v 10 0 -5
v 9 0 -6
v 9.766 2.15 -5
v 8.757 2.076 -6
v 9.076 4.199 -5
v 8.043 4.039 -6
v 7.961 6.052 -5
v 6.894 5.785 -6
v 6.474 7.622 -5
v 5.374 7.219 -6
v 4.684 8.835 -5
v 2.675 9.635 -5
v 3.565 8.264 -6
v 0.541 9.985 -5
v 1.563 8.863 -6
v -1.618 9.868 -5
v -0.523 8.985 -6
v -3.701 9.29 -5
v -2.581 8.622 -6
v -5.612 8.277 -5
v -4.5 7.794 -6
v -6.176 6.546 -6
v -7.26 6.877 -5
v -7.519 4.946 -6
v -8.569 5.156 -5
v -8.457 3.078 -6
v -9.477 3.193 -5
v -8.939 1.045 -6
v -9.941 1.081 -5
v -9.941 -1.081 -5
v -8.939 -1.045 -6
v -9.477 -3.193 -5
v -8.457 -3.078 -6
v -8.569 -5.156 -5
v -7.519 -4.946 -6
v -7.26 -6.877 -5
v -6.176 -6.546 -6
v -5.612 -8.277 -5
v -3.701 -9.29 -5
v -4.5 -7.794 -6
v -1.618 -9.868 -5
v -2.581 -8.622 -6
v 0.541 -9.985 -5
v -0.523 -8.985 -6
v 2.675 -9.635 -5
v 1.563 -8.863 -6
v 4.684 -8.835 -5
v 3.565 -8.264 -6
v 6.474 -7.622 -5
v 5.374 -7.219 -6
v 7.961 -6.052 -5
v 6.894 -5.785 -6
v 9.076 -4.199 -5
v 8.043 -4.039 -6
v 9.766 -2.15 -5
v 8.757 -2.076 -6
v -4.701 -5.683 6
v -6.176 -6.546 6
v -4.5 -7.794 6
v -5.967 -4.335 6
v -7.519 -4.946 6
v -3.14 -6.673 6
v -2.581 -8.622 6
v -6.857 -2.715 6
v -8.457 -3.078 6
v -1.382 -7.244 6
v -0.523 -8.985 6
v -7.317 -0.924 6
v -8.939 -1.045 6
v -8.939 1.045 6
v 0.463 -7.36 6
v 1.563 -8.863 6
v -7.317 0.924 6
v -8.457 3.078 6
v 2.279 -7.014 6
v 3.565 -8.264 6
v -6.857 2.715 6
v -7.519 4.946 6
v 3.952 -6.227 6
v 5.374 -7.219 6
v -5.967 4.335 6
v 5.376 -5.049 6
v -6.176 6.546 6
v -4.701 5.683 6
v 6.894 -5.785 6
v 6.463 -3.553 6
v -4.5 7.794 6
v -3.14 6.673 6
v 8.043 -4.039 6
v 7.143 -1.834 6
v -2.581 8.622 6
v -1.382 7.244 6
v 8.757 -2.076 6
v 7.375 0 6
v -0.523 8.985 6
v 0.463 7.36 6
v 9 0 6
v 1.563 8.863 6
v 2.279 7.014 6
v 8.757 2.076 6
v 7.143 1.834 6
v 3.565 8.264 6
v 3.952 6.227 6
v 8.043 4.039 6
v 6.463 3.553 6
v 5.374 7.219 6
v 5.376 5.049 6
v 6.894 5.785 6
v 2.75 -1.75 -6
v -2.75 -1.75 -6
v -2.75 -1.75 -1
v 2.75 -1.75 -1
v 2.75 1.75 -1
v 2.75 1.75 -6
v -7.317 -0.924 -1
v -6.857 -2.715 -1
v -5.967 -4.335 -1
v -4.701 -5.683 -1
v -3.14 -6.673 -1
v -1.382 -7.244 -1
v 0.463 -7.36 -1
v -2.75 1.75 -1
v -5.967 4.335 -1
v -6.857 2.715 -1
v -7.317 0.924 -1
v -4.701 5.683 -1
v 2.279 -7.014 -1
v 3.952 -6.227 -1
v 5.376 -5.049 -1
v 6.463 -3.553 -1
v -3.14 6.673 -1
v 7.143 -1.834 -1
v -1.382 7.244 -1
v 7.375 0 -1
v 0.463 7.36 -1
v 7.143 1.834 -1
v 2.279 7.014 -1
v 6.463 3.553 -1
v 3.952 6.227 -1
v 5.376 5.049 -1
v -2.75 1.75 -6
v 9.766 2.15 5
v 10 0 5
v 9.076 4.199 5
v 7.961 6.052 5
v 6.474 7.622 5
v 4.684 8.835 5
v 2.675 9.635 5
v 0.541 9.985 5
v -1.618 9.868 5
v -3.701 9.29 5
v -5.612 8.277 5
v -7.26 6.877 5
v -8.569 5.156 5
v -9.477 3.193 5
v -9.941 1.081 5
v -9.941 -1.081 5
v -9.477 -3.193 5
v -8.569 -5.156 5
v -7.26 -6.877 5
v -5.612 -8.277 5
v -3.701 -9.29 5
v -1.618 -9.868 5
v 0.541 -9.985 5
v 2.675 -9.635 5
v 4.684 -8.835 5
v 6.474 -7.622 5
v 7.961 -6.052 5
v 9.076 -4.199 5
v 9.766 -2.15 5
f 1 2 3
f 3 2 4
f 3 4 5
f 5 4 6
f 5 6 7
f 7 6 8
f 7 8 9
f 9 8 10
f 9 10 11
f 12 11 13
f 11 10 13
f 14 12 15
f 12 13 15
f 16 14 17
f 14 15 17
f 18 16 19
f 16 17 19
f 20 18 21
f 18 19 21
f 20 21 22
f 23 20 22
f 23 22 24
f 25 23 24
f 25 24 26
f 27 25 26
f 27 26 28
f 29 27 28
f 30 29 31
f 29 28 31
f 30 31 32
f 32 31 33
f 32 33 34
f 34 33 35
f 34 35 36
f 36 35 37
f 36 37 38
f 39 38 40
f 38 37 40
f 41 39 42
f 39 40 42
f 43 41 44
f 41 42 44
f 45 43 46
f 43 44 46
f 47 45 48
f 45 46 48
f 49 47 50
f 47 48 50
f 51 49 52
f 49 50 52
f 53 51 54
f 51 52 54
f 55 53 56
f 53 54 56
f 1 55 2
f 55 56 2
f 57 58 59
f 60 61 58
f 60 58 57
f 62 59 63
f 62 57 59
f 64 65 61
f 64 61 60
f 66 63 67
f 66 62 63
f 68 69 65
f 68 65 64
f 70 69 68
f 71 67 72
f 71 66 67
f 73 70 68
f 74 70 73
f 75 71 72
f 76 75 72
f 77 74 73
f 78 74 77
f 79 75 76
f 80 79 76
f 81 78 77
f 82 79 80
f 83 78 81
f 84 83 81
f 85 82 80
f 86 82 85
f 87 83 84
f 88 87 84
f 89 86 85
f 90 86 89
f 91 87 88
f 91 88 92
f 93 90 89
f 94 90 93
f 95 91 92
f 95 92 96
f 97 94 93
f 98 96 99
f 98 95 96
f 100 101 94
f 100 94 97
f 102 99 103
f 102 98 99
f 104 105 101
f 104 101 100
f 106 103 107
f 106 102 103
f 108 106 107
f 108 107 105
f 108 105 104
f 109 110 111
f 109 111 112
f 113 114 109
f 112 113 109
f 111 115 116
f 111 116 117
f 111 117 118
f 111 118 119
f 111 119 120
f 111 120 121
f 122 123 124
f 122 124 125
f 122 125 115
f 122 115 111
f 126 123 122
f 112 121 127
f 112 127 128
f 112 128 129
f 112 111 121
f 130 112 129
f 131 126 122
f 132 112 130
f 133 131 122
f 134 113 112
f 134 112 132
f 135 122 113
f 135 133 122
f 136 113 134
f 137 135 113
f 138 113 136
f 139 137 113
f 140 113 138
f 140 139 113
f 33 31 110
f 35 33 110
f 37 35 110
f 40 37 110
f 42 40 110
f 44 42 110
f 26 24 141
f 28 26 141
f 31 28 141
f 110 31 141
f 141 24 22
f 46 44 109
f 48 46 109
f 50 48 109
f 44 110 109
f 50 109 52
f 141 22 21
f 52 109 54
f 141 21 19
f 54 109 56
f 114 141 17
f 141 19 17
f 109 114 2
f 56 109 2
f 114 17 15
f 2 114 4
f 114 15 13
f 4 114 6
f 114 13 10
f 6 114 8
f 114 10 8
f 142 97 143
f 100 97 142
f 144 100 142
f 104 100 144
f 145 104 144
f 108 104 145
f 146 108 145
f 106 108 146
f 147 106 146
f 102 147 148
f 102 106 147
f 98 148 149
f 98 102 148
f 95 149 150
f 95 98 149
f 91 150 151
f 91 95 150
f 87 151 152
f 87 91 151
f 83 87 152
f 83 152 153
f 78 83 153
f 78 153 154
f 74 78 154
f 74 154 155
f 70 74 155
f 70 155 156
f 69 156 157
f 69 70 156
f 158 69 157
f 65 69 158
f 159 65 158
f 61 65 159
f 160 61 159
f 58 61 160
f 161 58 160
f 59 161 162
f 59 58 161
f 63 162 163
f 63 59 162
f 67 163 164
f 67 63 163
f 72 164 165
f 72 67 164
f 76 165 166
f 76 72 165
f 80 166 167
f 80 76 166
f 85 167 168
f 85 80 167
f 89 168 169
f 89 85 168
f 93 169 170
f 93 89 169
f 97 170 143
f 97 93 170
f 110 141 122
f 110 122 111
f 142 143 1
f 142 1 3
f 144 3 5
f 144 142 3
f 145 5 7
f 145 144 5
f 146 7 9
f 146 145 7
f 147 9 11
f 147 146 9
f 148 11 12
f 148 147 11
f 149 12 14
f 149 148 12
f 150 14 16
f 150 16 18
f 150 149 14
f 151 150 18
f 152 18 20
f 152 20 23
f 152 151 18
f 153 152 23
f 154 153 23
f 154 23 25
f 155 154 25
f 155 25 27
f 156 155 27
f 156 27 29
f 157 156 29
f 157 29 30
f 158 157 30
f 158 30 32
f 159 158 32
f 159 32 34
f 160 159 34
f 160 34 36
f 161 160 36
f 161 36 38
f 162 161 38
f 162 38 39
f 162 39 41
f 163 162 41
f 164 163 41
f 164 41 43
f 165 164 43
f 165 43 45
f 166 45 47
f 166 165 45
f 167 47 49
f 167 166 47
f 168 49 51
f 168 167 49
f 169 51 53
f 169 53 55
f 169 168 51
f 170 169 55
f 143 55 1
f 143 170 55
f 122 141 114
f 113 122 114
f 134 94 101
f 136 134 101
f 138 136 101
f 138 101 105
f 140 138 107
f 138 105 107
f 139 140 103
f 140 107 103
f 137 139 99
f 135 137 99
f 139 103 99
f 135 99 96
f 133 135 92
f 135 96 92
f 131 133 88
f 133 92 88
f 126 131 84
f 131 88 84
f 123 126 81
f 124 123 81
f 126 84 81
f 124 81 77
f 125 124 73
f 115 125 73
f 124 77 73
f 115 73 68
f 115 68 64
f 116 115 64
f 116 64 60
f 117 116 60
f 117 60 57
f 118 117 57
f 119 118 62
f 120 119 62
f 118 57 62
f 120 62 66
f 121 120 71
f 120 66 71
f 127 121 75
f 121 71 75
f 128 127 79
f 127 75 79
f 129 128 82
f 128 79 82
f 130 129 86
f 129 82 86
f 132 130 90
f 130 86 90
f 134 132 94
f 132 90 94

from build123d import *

# Parameters (mm, degrees)
SKETCH001_R     = 10
PAD_DEPTH       = 6
SKETCH_W        = 5.5
SKETCH_H        = 3.5
POCKET_DEPTH    = 12.001
SKETCH002_R     = 7.375
POCKET001_DEPTH = 7
CHAMFER_SIZE    = 1


with BuildPart() as part:
    # Sketch001 → Pad (new body, symmetric)
    with BuildSketch(Plane.XY):
        Circle(SKETCH001_R)
    extrude(amount=PAD_DEPTH, both=True)

    # Sketch → Pocket (cut, through all)
    with BuildSketch(Plane(origin=(0, 0, -6), x_dir=(1, 0, 0), z_dir=(0, 0, -1))):
        Rectangle(SKETCH_W, SKETCH_H)
    extrude(amount=-POCKET_DEPTH, mode=Mode.SUBTRACT)

    # Sketch002 → Pocket001 (cut)
    with BuildSketch(Plane.XY.offset(6)):
        Circle(SKETCH002_R)
    extrude(amount=-POCKET001_DEPTH, mode=Mode.SUBTRACT)

    # Chamfer
    chamfer_edges = [part.edges().sort_by_distance(p)[0] for p in [
        (-10, 0, 6),
        (-10, 0, -6),
    ]]
    chamfer(chamfer_edges, length=CHAMFER_SIZE)


solid = part.part
